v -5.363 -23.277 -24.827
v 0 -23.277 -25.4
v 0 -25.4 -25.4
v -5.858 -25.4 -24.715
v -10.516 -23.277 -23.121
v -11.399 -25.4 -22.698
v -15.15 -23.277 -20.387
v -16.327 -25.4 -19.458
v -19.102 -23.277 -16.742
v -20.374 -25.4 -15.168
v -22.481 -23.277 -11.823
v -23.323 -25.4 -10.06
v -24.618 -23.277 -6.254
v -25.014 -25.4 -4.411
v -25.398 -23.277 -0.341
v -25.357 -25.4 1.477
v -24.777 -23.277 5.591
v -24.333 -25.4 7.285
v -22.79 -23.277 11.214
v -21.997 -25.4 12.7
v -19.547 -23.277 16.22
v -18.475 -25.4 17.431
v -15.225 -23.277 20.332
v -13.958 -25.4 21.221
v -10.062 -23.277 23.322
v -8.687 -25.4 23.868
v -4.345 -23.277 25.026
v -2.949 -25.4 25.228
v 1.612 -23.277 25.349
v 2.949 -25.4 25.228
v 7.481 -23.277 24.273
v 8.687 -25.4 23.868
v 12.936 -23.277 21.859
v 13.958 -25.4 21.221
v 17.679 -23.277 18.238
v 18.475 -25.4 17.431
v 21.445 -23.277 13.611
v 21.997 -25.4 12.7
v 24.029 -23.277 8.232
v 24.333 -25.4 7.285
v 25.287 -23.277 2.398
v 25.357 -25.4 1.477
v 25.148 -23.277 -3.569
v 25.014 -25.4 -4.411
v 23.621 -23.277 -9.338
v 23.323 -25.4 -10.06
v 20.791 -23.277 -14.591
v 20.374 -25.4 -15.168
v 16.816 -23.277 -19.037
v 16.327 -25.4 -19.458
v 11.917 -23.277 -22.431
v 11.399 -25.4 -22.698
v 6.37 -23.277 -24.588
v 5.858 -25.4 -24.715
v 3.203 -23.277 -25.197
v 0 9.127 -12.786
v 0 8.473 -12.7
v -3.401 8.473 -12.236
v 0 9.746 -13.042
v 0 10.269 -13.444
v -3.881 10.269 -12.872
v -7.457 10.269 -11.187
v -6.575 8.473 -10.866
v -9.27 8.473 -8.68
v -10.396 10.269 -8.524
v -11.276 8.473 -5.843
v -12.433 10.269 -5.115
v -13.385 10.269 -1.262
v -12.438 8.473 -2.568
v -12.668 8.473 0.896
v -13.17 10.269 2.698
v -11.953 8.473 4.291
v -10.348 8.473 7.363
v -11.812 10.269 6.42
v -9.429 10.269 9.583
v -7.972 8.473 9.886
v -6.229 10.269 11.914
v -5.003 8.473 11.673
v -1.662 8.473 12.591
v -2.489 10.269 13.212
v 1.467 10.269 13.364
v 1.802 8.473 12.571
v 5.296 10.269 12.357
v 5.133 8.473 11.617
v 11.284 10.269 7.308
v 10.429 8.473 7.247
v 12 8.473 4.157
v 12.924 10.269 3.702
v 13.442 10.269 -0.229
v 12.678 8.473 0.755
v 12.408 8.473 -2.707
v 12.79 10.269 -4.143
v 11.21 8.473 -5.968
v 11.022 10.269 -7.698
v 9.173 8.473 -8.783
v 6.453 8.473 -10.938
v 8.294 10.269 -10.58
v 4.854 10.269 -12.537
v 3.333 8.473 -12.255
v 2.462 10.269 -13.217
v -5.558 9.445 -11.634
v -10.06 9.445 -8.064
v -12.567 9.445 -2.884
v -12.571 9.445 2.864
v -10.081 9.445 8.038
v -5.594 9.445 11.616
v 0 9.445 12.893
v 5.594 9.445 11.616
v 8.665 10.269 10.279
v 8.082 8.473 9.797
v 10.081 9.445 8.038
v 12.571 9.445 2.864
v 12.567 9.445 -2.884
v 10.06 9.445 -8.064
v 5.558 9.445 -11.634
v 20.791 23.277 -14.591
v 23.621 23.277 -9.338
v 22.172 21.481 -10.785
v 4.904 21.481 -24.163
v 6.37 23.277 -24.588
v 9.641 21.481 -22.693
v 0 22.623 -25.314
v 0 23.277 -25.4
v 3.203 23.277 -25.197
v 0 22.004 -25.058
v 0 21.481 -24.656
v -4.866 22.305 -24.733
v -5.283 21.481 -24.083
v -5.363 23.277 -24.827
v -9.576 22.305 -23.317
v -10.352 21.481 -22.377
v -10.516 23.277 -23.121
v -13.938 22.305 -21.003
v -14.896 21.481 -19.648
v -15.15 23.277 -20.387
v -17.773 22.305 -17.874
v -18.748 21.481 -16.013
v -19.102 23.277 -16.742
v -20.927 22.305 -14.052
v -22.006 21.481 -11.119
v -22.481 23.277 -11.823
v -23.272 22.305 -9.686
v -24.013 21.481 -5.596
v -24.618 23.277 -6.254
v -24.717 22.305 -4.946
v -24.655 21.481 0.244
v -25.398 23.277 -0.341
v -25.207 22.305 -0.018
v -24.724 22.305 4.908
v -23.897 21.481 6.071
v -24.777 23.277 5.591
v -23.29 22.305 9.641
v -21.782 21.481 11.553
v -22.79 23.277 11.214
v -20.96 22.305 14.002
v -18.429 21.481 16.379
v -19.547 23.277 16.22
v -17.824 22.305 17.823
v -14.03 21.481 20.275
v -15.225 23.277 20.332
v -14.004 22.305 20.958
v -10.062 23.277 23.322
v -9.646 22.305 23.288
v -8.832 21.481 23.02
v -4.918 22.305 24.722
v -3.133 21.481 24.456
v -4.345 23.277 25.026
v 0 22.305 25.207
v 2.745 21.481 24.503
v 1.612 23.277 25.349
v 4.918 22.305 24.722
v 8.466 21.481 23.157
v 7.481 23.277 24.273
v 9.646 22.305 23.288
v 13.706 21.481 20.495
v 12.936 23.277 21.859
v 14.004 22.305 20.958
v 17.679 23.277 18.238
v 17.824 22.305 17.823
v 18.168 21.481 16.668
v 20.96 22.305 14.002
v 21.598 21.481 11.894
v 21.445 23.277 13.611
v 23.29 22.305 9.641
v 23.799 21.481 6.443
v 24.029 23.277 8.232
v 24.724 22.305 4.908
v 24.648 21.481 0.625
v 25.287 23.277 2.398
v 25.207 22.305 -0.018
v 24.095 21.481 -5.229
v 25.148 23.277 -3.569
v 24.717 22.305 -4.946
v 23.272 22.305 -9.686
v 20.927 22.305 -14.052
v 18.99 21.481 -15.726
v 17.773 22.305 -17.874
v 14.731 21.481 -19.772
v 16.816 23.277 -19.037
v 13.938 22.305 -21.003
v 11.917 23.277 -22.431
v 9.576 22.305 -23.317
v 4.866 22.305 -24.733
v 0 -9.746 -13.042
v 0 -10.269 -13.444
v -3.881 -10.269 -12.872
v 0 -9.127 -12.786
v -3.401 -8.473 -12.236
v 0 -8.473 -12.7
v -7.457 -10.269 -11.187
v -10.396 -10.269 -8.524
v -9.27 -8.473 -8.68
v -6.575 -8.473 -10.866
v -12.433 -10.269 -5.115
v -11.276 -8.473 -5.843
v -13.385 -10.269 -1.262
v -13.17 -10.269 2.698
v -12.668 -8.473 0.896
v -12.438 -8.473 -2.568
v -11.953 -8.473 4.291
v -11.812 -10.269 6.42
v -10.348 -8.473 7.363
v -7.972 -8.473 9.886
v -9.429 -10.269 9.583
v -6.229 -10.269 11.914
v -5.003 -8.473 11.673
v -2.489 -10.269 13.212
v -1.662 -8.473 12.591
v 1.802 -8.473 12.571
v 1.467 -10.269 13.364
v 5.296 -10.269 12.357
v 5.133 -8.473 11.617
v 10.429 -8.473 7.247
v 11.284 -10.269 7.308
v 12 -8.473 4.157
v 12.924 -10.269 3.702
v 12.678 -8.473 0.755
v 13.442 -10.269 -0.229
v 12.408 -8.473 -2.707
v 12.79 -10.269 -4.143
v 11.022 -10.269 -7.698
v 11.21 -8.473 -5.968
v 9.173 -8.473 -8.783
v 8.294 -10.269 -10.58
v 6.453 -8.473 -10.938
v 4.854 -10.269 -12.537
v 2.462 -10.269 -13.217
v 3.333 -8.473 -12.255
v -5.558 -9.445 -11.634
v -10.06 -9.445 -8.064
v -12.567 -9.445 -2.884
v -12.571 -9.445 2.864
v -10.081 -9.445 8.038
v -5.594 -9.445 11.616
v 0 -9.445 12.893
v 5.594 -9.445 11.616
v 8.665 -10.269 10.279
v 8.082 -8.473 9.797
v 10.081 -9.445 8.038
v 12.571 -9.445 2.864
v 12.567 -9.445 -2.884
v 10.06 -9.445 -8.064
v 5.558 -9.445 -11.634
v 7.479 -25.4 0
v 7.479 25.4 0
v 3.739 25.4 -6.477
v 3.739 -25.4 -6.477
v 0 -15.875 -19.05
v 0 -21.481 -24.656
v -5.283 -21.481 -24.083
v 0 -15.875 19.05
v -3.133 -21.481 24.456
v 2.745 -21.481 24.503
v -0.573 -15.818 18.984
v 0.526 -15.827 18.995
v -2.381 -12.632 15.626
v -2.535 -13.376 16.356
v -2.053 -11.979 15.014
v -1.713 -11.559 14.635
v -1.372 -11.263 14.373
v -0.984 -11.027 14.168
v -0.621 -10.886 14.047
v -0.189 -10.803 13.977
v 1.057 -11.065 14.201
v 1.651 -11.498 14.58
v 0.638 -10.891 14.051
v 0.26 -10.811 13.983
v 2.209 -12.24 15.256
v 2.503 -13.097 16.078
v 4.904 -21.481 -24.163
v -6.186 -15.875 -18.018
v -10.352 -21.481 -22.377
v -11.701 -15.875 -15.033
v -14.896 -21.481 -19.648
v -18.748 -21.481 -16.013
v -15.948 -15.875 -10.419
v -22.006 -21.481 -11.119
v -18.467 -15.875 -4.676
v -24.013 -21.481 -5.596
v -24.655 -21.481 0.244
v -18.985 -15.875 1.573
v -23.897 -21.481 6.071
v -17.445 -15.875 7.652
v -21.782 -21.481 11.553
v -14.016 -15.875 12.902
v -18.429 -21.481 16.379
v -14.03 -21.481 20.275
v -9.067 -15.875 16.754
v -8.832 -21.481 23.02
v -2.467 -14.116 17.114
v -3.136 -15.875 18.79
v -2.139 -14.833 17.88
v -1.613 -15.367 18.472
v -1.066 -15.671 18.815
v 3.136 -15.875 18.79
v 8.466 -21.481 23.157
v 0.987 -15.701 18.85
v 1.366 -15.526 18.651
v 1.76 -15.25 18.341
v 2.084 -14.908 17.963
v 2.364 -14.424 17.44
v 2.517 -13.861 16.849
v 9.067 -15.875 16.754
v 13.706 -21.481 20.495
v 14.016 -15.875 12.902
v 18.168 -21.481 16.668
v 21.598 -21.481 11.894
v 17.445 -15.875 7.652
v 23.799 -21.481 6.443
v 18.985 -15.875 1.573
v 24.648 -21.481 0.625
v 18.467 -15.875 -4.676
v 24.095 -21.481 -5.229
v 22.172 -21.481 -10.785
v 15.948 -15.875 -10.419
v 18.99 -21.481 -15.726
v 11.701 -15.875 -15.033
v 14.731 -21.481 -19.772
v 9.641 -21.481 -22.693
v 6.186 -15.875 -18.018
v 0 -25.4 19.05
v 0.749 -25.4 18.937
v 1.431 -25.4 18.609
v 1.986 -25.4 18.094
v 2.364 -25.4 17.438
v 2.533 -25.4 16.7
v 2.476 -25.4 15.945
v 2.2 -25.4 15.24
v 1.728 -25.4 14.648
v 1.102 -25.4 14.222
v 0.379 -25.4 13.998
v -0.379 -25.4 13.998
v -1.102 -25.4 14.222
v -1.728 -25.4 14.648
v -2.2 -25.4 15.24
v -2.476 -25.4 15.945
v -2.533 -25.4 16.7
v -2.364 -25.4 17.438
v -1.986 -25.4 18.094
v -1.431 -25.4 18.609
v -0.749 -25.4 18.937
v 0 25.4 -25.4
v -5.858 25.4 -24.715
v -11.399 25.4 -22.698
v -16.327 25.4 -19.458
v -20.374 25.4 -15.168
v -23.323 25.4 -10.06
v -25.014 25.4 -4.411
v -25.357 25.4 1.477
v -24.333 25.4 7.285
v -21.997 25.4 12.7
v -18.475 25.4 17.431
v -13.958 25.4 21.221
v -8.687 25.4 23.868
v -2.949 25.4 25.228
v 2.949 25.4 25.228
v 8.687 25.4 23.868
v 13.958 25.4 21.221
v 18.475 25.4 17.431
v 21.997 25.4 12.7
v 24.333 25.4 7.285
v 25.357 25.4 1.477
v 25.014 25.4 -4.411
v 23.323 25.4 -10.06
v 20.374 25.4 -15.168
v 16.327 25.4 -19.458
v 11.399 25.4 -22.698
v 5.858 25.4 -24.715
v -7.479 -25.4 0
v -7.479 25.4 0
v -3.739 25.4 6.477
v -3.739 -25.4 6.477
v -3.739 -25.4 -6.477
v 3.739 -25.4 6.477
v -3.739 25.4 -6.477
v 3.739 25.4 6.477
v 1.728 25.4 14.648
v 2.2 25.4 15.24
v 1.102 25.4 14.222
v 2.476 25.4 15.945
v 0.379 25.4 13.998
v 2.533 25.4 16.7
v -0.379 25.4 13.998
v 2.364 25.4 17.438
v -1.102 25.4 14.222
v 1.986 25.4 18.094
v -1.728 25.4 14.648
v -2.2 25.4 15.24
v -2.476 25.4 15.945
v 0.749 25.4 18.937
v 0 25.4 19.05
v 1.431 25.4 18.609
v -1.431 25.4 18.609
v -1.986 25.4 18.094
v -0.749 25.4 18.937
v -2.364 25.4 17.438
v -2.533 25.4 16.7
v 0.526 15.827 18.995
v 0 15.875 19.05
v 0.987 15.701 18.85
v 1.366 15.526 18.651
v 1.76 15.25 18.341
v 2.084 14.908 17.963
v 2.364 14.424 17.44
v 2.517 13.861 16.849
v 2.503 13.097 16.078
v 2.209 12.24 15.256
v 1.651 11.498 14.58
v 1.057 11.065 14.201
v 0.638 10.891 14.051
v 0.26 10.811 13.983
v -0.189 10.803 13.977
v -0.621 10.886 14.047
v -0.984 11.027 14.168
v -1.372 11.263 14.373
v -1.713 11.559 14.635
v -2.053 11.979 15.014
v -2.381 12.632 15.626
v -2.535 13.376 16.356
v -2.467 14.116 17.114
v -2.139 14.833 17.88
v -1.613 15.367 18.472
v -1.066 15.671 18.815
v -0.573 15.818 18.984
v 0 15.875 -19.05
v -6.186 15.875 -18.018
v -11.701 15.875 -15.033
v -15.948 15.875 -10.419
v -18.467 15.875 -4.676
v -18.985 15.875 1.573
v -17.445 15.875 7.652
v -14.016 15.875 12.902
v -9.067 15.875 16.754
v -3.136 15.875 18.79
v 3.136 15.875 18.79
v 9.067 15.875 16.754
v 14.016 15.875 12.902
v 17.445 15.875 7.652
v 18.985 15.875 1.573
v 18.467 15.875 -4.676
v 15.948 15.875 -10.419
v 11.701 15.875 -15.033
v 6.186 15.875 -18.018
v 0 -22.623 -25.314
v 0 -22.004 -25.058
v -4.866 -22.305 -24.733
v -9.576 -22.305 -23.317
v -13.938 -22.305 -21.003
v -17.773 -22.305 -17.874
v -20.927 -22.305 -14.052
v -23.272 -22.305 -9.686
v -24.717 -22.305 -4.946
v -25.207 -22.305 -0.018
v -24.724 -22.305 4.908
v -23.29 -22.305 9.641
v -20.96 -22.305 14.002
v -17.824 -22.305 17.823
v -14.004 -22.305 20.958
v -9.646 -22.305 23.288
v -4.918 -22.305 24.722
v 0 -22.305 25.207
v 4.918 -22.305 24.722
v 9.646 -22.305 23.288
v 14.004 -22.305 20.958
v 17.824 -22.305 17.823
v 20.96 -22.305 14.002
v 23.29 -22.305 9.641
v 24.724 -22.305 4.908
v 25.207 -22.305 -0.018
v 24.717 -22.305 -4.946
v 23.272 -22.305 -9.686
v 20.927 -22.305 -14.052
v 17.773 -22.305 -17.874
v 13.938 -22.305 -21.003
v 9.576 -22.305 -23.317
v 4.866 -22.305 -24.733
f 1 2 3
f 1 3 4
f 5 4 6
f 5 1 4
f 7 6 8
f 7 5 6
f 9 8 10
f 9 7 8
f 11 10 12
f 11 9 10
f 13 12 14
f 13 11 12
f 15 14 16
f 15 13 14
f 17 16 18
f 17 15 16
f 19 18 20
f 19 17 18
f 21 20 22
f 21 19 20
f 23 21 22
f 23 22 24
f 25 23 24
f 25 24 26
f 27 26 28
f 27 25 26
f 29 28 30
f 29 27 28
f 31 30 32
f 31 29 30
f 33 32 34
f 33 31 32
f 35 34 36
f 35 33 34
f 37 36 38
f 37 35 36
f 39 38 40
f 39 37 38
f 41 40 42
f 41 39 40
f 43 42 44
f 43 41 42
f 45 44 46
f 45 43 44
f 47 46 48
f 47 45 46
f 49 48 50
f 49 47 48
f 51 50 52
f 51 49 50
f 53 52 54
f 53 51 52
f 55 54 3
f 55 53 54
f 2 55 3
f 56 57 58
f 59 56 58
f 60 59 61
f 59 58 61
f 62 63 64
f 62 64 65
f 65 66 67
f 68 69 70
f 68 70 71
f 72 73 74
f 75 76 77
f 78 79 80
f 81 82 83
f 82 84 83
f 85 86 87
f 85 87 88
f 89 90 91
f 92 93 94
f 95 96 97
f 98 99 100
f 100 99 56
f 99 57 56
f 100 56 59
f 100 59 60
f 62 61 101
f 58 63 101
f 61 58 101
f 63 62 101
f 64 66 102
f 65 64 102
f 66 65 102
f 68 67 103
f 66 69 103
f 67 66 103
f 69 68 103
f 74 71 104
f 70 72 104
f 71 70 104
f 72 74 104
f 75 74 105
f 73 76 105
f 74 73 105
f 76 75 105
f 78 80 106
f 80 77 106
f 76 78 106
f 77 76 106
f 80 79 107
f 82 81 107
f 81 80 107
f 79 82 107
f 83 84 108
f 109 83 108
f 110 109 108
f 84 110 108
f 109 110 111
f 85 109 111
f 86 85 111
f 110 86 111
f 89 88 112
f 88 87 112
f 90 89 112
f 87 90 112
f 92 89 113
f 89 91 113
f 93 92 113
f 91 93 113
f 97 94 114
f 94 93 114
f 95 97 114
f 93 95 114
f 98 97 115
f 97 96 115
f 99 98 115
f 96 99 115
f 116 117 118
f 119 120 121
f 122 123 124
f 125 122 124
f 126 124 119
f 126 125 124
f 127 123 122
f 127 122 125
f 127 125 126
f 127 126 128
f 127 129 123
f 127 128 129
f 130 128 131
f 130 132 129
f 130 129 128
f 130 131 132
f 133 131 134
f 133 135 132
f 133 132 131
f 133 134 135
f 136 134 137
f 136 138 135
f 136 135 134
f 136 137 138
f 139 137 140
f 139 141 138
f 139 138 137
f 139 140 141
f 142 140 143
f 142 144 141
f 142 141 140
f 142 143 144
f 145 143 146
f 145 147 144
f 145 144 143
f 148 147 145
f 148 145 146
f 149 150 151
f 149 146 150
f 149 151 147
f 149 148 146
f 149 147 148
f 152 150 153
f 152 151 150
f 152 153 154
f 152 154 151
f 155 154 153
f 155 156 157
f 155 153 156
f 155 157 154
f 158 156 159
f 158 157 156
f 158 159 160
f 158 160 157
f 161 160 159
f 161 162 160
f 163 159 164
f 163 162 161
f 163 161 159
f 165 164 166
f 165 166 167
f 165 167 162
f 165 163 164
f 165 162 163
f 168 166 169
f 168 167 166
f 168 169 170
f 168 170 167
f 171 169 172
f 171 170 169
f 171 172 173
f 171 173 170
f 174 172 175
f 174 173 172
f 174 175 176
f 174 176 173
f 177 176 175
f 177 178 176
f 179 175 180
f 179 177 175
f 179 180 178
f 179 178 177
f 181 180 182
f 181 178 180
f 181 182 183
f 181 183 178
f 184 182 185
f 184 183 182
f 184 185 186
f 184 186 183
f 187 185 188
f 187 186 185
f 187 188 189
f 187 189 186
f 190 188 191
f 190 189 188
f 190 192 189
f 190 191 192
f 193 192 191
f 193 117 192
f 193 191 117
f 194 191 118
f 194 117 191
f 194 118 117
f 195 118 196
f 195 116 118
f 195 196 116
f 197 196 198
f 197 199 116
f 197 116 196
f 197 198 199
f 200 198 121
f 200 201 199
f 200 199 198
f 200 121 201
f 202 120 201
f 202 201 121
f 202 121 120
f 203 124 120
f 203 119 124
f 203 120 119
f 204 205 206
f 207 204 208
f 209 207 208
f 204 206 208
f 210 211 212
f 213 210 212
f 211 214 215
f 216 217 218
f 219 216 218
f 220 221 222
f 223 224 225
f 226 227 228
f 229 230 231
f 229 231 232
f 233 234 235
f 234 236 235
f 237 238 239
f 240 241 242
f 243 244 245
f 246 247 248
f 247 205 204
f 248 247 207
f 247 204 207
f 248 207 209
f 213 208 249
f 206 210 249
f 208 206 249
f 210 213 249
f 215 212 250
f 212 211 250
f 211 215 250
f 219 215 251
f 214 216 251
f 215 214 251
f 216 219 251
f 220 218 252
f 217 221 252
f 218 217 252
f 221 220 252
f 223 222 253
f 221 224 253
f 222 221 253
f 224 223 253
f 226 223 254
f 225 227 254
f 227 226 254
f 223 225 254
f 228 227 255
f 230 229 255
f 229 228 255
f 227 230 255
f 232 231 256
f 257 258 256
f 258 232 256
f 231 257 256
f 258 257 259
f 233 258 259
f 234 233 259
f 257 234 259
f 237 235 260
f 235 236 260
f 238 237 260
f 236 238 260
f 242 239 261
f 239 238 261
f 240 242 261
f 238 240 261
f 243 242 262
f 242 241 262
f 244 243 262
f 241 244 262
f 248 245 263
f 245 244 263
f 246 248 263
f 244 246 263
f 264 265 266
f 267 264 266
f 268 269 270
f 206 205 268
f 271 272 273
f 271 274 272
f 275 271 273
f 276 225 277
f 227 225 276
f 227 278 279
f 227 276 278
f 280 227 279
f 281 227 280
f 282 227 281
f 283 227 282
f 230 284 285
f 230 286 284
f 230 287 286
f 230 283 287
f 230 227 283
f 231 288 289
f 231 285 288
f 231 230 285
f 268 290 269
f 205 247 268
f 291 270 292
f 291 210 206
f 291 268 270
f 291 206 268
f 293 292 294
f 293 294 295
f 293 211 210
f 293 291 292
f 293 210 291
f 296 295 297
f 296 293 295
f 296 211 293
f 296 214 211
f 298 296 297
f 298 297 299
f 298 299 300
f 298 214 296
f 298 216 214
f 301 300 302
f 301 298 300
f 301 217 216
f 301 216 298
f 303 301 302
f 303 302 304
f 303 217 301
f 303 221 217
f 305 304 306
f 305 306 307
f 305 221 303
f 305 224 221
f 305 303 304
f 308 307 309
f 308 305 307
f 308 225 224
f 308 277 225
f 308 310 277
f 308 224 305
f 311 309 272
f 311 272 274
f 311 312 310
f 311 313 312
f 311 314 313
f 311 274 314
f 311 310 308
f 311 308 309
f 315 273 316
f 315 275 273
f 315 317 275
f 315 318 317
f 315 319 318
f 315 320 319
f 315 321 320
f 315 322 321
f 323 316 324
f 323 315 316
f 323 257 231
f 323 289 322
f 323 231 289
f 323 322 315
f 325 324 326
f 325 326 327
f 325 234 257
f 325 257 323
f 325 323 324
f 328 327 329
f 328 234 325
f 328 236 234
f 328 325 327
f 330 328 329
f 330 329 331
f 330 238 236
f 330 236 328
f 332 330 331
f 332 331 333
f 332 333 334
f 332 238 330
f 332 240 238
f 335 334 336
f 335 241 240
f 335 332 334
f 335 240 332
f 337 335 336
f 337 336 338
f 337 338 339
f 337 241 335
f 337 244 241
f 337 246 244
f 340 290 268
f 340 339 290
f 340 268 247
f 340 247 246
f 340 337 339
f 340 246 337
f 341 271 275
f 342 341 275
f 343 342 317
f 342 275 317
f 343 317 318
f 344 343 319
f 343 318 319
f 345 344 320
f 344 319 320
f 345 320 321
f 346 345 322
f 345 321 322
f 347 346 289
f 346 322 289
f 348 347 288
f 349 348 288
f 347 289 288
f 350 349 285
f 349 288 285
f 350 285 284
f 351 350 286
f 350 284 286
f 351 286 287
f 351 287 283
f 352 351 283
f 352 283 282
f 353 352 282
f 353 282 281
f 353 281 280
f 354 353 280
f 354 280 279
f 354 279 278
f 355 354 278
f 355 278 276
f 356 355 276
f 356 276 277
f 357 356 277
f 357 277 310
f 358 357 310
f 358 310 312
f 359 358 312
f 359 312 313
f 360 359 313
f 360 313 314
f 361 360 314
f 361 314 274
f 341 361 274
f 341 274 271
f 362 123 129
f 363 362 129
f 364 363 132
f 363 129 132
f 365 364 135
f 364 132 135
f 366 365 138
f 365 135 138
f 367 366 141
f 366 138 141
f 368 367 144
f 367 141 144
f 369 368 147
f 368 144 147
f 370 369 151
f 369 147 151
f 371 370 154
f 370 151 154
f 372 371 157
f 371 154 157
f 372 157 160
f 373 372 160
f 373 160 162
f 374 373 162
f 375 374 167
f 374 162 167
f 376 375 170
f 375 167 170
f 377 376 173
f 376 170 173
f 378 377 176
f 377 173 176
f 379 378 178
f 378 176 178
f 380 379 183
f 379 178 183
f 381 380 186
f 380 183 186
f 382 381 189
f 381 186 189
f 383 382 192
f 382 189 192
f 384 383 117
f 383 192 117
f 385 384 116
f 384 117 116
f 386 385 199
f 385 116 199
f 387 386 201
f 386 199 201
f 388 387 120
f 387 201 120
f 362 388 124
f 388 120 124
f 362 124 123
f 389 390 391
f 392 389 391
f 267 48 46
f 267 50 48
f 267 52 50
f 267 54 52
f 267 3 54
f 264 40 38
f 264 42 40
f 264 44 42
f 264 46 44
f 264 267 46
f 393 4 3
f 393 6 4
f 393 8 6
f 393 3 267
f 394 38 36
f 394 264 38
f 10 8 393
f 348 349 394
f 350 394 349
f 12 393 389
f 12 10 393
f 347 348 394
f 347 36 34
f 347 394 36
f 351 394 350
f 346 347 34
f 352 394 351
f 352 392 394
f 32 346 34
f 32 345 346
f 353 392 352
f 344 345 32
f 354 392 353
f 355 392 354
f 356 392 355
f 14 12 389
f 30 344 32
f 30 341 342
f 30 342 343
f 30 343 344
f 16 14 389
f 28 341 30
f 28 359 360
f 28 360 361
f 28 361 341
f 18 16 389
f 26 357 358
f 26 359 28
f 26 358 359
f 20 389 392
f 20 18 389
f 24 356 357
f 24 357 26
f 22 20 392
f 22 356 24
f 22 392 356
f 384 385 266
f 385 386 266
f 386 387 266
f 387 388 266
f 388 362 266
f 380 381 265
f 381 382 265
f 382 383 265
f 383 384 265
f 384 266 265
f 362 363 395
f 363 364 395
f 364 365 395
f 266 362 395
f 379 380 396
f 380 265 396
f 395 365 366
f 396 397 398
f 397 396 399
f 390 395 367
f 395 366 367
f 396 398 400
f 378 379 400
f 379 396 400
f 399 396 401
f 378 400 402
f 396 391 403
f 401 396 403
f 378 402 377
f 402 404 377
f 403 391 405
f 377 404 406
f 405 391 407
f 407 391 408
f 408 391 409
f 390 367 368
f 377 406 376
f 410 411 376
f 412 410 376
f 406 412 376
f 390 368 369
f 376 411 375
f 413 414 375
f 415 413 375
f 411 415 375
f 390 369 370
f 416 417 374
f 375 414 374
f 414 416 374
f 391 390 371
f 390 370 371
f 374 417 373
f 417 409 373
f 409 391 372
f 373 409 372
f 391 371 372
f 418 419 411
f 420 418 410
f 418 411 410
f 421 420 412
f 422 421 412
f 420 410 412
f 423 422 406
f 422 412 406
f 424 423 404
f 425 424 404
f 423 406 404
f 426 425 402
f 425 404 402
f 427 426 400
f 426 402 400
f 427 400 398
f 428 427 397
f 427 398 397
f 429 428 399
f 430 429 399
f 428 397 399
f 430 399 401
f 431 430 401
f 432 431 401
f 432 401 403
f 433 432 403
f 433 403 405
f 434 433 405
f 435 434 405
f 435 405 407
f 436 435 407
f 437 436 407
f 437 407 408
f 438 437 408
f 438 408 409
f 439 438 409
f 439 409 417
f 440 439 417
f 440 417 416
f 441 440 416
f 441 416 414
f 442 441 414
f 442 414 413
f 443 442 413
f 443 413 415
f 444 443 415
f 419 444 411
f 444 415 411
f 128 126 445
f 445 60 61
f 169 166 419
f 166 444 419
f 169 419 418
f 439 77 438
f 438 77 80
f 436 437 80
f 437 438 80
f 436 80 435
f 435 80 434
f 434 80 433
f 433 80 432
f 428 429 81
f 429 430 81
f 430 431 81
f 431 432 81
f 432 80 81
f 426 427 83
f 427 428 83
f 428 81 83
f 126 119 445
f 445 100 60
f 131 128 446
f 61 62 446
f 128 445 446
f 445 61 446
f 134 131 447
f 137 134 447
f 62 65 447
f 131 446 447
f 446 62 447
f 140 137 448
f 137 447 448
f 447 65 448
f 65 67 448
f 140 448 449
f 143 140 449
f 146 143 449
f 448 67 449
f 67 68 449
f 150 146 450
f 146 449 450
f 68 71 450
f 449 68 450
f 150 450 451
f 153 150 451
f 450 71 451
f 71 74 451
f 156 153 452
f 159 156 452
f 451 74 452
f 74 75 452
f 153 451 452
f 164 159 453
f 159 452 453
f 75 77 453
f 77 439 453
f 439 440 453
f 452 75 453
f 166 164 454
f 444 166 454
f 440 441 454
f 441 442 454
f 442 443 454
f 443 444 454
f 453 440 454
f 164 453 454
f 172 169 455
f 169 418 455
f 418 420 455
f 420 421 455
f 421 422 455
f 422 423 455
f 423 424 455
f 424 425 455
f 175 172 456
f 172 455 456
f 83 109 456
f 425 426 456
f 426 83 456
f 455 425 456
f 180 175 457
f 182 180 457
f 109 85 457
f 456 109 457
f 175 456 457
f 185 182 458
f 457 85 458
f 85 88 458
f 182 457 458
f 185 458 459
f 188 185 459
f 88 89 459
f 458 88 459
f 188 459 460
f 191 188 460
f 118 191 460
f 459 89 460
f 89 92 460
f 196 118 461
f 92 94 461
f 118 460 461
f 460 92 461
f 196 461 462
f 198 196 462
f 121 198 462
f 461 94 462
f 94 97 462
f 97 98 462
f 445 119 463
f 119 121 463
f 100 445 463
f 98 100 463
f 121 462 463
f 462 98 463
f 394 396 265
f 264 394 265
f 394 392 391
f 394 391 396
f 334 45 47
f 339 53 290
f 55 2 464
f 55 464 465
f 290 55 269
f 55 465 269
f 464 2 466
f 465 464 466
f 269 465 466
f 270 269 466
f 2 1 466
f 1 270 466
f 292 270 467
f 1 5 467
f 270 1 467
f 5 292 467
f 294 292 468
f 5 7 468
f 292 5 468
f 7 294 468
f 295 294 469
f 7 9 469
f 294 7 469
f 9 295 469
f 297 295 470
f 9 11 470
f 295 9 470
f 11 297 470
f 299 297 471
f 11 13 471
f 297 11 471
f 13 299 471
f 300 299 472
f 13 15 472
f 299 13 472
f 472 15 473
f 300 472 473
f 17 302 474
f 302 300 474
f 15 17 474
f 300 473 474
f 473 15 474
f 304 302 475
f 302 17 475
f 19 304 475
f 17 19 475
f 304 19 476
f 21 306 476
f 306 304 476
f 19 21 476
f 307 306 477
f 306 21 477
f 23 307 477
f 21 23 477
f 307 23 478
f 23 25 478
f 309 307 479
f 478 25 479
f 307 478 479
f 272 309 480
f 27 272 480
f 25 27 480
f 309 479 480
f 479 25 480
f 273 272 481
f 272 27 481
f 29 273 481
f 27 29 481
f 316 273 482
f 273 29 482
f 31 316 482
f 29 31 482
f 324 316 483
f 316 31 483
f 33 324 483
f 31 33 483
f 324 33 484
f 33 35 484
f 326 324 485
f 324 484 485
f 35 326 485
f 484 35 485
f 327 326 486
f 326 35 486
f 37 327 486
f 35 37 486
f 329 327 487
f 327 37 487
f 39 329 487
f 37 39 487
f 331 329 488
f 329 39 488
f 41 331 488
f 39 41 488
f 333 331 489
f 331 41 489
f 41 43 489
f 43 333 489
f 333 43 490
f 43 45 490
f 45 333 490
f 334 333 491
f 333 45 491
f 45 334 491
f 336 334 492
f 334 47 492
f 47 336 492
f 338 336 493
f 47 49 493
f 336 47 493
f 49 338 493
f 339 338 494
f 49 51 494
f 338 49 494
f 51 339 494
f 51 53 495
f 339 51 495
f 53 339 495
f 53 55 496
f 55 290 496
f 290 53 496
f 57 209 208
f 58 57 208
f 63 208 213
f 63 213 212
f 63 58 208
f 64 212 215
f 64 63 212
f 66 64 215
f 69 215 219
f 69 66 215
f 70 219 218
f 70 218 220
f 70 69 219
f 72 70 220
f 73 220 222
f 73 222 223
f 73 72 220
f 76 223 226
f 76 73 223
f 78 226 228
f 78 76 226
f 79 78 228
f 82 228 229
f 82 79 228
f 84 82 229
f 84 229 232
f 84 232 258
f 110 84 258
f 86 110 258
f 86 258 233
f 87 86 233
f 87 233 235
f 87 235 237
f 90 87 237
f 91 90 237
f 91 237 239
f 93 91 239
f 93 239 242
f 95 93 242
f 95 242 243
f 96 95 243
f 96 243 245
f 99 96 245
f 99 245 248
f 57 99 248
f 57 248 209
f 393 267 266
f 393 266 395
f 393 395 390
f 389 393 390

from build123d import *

# Parameters (mm, degrees)
SKETCH2_R          = 2.54
CUT_EXTRUDE1_DEPTH = 63.217039467
FILLET1_R          = 2.54


with BuildPart() as part:
    # Sketch1 → Revolve1 (revolve)
    with BuildSketch(Plane(origin=(0, 0, 0), x_dir=(0, 0, -1), z_dir=(1, 0, 0))):
        Polygon((0, 0), (0, 25.4), (25.4, 25.4), (25.4, 22.225), (12.7, 9.525), (12.7, 0), align=None)
    revolve1 = revolve(axis=Axis((0, 0, 0), (0, 1, 0)))

    # Mirror1: Revolve1 across plane
    add(revolve1.mirror(Plane(origin=(0, 0, -12.7), x_dir=(0, 0, 1), z_dir=(0, -1, 0))))

    # Sketch2 → Cut-Extrude1 (cut, through all)
    with BuildSketch(Plane(origin=(0, 25.4, 0), x_dir=(1, 0, 0), z_dir=(0, 1, 0))):
        with Locations(Location((0, -16.51, 0), (0, 0, 270))):
            Circle(SKETCH2_R)
        Polygon((-7.478995387, 0), (-3.739497694, -6.477), (3.739497694, -6.477), (7.478995387, 0), (3.739497694, 6.477), (-3.739497694, 6.477), align=None)
    extrude(amount=-CUT_EXTRUDE1_DEPTH, mode=Mode.SUBTRACT)

    # Fillet1
    fillet1_edges = [part.edges().sort_by_distance(p)[0] for p in [
        (0, -22.225, 25.4),
        (0, -9.525, 12.7),
        (0, 9.525, 12.7),
        (0, 22.225, 25.4),
    ]]
    fillet(fillet1_edges, radius=FILLET1_R)


solid = part.part
